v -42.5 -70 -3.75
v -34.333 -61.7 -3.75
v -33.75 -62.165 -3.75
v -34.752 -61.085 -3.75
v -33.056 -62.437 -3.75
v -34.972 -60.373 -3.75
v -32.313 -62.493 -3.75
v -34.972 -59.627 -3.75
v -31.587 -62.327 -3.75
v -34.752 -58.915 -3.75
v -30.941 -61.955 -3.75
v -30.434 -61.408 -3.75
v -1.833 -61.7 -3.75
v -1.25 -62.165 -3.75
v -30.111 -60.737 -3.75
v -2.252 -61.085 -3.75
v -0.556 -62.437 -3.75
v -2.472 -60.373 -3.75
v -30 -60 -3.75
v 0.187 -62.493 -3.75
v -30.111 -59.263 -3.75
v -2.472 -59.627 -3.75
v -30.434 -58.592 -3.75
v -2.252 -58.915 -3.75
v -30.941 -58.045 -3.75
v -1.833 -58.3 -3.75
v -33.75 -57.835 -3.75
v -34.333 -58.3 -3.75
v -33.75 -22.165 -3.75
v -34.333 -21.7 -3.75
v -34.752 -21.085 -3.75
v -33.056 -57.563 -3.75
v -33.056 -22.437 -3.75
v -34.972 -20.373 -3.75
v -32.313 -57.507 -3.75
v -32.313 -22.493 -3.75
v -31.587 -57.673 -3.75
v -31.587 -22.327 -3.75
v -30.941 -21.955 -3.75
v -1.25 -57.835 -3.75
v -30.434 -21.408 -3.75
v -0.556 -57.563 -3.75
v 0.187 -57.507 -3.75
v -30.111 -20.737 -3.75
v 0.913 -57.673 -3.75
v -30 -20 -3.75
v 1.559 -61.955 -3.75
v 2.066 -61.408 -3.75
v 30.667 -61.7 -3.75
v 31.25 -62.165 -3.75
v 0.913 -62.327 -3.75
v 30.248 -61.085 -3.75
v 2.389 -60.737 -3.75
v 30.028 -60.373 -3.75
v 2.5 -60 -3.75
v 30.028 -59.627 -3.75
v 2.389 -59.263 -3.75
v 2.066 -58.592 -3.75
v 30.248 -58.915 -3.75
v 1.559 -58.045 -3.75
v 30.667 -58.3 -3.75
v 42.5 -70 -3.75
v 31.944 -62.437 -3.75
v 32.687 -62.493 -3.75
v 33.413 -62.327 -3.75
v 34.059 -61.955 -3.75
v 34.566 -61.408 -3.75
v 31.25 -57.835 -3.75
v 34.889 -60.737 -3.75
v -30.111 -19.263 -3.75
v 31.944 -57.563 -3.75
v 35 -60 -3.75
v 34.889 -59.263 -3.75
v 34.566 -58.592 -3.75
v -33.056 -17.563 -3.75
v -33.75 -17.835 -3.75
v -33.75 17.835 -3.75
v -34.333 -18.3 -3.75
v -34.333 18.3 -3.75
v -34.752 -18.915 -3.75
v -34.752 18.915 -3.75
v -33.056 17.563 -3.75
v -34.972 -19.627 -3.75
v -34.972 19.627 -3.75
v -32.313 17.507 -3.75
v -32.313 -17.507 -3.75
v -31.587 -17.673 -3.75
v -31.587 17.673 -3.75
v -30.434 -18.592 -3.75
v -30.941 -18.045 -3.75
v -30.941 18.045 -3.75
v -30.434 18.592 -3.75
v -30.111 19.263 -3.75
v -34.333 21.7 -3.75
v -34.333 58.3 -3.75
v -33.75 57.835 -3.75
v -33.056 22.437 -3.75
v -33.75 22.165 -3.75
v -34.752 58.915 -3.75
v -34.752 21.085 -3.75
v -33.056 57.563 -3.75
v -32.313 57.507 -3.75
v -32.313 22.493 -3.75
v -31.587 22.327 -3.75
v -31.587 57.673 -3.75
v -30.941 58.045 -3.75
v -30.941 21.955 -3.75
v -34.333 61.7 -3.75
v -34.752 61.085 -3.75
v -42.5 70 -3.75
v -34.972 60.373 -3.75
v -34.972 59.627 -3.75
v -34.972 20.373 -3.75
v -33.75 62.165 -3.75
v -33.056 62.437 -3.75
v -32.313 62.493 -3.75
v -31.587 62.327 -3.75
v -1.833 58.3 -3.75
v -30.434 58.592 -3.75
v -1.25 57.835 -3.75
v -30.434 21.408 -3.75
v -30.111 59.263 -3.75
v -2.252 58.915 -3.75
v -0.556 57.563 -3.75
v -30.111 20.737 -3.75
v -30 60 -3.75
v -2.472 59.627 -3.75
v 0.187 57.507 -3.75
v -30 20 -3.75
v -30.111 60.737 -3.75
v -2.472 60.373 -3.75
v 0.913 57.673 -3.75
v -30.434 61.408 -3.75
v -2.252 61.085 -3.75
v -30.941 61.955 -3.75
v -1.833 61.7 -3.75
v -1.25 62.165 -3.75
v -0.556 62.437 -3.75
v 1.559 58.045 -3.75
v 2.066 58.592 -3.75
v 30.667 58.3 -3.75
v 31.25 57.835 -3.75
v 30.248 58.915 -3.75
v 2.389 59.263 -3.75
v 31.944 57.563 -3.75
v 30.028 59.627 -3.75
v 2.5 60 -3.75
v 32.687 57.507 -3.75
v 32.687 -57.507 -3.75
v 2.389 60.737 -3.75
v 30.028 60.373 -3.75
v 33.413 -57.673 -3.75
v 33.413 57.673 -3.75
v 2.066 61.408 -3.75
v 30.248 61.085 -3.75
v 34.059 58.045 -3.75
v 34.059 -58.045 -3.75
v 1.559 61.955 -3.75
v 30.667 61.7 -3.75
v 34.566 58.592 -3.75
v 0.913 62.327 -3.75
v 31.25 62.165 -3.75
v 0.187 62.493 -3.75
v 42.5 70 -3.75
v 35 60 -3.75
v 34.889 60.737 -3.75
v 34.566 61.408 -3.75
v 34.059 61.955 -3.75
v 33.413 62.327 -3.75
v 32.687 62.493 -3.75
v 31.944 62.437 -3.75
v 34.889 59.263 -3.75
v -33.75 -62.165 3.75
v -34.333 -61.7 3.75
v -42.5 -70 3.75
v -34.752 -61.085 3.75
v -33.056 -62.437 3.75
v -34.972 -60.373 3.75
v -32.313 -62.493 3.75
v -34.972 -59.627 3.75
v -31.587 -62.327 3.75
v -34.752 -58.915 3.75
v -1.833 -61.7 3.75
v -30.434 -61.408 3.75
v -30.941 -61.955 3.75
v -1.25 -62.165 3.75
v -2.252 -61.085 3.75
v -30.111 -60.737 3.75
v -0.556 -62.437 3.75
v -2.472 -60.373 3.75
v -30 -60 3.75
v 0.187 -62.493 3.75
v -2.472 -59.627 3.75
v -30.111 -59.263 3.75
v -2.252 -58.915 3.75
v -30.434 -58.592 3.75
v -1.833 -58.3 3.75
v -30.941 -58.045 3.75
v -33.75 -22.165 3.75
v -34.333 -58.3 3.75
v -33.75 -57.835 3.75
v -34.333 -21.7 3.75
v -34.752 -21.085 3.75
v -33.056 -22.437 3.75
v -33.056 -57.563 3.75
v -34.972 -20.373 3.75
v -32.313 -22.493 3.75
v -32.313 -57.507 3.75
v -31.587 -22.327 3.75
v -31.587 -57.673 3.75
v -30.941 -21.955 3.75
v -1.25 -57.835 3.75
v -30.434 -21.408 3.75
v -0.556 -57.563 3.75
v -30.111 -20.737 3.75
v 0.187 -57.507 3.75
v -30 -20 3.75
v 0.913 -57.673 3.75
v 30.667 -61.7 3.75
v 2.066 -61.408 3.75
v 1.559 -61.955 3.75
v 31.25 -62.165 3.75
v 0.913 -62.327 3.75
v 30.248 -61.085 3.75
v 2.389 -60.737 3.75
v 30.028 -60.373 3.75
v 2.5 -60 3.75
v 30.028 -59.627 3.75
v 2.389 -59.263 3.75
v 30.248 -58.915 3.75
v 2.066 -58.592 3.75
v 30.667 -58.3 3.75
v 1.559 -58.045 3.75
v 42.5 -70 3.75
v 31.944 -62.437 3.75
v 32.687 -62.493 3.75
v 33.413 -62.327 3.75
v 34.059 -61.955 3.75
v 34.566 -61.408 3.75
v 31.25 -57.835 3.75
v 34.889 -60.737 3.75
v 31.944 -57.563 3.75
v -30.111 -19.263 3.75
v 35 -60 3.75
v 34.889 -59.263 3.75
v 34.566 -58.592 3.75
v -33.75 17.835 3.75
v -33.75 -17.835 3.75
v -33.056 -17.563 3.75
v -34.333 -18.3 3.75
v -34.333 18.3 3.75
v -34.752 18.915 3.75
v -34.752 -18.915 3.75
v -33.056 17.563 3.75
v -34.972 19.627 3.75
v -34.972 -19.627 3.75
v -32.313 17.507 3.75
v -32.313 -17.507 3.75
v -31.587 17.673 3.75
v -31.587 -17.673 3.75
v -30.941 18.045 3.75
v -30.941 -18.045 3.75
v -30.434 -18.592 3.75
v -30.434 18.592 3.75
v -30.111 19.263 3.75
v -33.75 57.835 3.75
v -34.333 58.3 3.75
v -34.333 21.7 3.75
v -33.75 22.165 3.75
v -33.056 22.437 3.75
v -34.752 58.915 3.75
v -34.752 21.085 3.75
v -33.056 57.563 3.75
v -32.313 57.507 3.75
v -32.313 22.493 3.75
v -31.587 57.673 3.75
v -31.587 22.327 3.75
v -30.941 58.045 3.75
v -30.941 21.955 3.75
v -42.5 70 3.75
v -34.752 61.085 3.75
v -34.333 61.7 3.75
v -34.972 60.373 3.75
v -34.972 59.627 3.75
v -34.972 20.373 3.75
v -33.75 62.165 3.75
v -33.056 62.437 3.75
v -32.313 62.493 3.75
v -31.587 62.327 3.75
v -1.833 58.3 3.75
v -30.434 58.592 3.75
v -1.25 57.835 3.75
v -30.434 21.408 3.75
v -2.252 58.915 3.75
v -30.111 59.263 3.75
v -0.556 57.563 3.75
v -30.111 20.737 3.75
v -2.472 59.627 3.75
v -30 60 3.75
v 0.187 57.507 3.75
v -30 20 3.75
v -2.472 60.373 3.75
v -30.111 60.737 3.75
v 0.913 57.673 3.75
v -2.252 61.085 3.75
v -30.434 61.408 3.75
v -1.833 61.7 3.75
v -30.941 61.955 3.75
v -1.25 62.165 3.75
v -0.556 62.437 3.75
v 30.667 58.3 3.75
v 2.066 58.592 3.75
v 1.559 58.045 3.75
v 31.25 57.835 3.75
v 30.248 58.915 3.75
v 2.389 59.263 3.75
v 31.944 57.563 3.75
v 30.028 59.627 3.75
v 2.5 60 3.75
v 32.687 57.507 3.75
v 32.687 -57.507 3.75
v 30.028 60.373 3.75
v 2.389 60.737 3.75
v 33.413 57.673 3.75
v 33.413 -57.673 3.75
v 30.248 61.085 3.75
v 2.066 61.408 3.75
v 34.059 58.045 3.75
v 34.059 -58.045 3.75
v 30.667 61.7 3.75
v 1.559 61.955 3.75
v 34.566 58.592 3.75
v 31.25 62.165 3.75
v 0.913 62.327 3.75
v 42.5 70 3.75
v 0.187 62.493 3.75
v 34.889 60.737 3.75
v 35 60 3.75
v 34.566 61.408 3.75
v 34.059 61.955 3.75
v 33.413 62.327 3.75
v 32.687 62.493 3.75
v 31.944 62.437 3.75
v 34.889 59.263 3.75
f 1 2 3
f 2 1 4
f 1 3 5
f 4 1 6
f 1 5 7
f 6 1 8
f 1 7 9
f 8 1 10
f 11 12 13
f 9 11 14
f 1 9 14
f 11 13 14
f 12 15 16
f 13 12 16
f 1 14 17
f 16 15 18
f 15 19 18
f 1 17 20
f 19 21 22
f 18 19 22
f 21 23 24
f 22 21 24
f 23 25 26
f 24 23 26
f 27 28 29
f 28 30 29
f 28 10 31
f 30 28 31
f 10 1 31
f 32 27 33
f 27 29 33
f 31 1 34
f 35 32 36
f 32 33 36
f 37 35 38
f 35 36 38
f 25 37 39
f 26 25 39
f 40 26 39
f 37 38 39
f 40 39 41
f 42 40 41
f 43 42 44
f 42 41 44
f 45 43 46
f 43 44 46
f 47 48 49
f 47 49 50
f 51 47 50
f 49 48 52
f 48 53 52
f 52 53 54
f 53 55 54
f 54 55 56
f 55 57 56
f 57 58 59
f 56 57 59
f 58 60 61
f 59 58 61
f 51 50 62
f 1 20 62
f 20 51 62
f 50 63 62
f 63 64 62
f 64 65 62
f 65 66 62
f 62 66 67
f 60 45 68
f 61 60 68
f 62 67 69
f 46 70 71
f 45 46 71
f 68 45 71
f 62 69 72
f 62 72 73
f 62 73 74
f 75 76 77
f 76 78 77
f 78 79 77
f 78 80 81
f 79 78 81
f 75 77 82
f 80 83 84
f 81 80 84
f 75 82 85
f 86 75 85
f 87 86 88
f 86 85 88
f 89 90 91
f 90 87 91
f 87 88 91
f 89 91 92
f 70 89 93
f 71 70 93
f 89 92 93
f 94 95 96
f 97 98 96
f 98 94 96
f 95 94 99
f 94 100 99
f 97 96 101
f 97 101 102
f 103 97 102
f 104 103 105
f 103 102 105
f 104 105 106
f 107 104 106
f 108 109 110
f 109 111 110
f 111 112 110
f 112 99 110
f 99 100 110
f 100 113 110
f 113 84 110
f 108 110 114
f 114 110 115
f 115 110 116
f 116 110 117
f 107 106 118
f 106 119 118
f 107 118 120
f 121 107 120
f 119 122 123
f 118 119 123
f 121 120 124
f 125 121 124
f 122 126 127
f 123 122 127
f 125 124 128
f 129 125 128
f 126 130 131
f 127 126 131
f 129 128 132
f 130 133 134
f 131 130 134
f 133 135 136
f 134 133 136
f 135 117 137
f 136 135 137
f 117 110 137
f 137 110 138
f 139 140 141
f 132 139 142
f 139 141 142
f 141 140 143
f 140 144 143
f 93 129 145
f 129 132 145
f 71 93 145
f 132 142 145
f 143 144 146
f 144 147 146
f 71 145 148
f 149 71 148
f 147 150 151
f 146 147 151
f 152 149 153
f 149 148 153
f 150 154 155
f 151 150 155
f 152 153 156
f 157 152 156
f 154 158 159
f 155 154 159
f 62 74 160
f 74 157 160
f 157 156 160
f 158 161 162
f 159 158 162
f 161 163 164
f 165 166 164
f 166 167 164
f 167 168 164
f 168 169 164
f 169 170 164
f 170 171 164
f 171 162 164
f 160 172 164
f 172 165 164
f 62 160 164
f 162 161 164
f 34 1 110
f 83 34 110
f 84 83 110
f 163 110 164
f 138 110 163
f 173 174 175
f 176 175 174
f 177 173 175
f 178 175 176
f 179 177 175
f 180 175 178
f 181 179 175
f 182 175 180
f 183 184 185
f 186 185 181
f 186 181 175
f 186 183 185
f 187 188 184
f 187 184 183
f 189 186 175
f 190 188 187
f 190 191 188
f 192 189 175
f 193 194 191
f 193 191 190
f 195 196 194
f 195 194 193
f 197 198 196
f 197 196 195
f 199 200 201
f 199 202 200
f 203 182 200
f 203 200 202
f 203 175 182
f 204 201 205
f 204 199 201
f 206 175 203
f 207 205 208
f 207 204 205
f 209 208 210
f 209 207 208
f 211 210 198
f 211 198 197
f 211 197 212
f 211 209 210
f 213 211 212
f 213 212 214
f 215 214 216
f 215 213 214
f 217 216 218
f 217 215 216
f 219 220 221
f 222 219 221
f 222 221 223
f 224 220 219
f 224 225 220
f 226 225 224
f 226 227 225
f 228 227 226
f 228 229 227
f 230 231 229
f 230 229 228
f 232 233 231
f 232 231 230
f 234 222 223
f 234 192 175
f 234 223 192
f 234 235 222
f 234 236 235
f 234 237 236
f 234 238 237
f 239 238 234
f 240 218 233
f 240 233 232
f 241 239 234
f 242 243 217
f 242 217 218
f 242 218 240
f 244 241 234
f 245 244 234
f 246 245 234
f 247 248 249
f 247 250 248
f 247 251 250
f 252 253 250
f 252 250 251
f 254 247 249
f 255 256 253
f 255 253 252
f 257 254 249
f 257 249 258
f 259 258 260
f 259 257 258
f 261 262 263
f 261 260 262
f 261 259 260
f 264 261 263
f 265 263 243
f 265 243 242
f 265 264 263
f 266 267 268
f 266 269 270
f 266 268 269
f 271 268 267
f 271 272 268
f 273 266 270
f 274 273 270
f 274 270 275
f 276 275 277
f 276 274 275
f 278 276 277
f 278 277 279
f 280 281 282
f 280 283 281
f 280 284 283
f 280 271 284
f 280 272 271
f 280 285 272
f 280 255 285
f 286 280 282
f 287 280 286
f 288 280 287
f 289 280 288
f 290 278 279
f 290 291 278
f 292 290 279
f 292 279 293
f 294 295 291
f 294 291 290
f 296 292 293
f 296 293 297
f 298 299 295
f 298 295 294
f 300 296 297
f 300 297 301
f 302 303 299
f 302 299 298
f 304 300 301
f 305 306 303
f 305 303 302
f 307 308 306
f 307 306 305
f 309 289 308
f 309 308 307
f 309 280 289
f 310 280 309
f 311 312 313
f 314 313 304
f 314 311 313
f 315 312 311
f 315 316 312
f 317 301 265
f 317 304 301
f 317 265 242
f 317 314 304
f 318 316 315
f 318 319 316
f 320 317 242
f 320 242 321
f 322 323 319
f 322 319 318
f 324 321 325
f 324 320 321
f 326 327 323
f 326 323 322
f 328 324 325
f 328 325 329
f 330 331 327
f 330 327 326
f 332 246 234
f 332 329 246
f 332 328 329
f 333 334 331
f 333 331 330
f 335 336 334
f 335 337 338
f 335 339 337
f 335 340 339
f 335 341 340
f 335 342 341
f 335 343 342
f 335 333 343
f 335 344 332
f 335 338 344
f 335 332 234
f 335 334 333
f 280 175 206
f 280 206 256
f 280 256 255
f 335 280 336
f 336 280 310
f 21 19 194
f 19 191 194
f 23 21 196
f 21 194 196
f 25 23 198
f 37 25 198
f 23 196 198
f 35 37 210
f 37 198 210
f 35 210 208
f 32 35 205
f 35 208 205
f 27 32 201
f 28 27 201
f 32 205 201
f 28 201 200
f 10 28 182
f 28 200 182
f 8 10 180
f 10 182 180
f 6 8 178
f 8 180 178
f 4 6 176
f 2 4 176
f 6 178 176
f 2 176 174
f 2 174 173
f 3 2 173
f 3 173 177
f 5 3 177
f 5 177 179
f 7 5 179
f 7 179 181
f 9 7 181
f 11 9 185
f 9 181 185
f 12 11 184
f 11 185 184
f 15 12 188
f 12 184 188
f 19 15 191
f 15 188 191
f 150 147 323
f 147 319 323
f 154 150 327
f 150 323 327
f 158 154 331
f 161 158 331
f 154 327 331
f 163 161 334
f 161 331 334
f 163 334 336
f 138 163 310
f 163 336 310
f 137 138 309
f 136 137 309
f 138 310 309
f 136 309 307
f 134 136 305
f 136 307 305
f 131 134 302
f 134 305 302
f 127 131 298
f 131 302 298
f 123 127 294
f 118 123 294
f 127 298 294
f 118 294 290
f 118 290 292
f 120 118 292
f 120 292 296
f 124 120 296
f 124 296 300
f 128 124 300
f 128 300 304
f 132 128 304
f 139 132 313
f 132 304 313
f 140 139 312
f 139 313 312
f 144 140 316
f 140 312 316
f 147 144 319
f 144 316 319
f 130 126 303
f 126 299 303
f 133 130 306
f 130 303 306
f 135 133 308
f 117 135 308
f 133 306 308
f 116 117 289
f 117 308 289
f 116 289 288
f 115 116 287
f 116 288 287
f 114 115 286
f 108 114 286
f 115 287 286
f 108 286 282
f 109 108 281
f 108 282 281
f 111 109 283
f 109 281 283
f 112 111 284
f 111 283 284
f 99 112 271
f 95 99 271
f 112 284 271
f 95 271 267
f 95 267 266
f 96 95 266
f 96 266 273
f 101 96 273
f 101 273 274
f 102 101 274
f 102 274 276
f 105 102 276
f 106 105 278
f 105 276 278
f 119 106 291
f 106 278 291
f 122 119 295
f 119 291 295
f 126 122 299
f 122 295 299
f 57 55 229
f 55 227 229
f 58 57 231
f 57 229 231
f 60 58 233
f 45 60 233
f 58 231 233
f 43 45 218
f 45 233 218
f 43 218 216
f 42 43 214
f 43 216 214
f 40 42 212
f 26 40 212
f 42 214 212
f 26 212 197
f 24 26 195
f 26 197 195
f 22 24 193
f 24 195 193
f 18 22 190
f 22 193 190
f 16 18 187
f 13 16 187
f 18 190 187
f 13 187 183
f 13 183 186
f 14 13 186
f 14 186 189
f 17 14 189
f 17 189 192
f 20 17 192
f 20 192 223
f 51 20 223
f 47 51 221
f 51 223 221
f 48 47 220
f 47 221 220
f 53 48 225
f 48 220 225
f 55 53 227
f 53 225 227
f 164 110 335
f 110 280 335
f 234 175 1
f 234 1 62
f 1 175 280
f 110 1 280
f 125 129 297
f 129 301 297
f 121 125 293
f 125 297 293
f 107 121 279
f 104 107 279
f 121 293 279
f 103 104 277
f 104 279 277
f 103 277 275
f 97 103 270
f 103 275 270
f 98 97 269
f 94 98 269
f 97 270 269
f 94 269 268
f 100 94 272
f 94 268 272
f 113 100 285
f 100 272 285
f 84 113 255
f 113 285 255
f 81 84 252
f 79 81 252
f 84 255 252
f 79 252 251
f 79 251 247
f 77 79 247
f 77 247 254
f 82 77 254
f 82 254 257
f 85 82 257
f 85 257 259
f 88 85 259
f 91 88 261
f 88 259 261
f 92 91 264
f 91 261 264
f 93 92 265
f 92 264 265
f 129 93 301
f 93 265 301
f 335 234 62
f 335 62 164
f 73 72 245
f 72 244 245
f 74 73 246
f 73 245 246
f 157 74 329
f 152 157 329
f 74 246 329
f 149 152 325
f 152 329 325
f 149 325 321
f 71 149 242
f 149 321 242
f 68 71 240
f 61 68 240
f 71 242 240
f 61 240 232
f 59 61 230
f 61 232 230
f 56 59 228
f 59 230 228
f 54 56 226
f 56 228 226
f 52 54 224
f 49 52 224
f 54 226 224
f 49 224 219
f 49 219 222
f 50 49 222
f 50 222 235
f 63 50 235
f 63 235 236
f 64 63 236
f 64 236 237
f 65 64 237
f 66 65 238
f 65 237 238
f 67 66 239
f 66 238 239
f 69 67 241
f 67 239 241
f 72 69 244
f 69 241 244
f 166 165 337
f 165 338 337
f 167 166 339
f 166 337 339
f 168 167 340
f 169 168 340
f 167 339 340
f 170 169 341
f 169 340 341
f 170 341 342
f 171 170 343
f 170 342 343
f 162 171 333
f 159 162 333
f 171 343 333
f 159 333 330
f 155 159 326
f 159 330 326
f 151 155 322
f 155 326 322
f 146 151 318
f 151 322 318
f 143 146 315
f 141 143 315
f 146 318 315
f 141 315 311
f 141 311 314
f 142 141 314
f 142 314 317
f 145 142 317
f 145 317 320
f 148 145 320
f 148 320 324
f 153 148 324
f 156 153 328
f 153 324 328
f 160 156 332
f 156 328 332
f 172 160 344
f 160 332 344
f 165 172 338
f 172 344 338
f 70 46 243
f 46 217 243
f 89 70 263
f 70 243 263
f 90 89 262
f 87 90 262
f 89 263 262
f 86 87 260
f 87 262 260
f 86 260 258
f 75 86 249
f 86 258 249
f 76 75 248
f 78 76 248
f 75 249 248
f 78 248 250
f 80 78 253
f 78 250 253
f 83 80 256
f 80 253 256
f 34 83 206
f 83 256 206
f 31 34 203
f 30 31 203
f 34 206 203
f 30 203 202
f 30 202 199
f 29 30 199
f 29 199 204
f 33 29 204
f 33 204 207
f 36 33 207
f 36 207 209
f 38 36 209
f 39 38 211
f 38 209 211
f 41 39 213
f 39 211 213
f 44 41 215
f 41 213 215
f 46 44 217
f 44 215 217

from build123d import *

# Parameters (mm, degrees)
SKETCH1_W            = 85
SKETCH1_H            = 140
BOSS_EXTRUDE1_DEPTH  = 3.75
SKETCH2_R            = 2.5
CUT_EXTRUDE1_DEPTH   = 83.234421017
LPATTERN1_COUNT      = 3
LPATTERN1_PITCH      = 32.5
LPATTERN1_COUNT_DIR2 = 4
LPATTERN1_PITCH_DIR2 = 40


with BuildPart() as part:
    # Sketch1 → Boss-Extrude1 (new, symmetric)
    with BuildSketch(Plane.XY):
        Rectangle(SKETCH1_W, SKETCH1_H)
    extrude(amount=BOSS_EXTRUDE1_DEPTH, both=True)

    # Sketch2 → Cut-Extrude1 (cut, symmetric)
    with BuildSketch(Plane.XY.offset(3.75)):
        with Locations((-32.5, 60)):
            Circle(SKETCH2_R)
    cut_extrude1 = extrude(amount=CUT_EXTRUDE1_DEPTH, both=True, mode=Mode.SUBTRACT)

    # LPattern1: Cut-Extrude1 3 × 4, 4 skipped
    with Locations(*[(i * LPATTERN1_PITCH, -j * LPATTERN1_PITCH_DIR2, 0) for i in range(LPATTERN1_COUNT) for j in range(LPATTERN1_COUNT_DIR2) if (i, j) not in ((0, 0), (1, 1), (1, 2), (2, 1), (2, 2))]):
        add(cut_extrude1, mode=Mode.SUBTRACT)


solid = part.part
